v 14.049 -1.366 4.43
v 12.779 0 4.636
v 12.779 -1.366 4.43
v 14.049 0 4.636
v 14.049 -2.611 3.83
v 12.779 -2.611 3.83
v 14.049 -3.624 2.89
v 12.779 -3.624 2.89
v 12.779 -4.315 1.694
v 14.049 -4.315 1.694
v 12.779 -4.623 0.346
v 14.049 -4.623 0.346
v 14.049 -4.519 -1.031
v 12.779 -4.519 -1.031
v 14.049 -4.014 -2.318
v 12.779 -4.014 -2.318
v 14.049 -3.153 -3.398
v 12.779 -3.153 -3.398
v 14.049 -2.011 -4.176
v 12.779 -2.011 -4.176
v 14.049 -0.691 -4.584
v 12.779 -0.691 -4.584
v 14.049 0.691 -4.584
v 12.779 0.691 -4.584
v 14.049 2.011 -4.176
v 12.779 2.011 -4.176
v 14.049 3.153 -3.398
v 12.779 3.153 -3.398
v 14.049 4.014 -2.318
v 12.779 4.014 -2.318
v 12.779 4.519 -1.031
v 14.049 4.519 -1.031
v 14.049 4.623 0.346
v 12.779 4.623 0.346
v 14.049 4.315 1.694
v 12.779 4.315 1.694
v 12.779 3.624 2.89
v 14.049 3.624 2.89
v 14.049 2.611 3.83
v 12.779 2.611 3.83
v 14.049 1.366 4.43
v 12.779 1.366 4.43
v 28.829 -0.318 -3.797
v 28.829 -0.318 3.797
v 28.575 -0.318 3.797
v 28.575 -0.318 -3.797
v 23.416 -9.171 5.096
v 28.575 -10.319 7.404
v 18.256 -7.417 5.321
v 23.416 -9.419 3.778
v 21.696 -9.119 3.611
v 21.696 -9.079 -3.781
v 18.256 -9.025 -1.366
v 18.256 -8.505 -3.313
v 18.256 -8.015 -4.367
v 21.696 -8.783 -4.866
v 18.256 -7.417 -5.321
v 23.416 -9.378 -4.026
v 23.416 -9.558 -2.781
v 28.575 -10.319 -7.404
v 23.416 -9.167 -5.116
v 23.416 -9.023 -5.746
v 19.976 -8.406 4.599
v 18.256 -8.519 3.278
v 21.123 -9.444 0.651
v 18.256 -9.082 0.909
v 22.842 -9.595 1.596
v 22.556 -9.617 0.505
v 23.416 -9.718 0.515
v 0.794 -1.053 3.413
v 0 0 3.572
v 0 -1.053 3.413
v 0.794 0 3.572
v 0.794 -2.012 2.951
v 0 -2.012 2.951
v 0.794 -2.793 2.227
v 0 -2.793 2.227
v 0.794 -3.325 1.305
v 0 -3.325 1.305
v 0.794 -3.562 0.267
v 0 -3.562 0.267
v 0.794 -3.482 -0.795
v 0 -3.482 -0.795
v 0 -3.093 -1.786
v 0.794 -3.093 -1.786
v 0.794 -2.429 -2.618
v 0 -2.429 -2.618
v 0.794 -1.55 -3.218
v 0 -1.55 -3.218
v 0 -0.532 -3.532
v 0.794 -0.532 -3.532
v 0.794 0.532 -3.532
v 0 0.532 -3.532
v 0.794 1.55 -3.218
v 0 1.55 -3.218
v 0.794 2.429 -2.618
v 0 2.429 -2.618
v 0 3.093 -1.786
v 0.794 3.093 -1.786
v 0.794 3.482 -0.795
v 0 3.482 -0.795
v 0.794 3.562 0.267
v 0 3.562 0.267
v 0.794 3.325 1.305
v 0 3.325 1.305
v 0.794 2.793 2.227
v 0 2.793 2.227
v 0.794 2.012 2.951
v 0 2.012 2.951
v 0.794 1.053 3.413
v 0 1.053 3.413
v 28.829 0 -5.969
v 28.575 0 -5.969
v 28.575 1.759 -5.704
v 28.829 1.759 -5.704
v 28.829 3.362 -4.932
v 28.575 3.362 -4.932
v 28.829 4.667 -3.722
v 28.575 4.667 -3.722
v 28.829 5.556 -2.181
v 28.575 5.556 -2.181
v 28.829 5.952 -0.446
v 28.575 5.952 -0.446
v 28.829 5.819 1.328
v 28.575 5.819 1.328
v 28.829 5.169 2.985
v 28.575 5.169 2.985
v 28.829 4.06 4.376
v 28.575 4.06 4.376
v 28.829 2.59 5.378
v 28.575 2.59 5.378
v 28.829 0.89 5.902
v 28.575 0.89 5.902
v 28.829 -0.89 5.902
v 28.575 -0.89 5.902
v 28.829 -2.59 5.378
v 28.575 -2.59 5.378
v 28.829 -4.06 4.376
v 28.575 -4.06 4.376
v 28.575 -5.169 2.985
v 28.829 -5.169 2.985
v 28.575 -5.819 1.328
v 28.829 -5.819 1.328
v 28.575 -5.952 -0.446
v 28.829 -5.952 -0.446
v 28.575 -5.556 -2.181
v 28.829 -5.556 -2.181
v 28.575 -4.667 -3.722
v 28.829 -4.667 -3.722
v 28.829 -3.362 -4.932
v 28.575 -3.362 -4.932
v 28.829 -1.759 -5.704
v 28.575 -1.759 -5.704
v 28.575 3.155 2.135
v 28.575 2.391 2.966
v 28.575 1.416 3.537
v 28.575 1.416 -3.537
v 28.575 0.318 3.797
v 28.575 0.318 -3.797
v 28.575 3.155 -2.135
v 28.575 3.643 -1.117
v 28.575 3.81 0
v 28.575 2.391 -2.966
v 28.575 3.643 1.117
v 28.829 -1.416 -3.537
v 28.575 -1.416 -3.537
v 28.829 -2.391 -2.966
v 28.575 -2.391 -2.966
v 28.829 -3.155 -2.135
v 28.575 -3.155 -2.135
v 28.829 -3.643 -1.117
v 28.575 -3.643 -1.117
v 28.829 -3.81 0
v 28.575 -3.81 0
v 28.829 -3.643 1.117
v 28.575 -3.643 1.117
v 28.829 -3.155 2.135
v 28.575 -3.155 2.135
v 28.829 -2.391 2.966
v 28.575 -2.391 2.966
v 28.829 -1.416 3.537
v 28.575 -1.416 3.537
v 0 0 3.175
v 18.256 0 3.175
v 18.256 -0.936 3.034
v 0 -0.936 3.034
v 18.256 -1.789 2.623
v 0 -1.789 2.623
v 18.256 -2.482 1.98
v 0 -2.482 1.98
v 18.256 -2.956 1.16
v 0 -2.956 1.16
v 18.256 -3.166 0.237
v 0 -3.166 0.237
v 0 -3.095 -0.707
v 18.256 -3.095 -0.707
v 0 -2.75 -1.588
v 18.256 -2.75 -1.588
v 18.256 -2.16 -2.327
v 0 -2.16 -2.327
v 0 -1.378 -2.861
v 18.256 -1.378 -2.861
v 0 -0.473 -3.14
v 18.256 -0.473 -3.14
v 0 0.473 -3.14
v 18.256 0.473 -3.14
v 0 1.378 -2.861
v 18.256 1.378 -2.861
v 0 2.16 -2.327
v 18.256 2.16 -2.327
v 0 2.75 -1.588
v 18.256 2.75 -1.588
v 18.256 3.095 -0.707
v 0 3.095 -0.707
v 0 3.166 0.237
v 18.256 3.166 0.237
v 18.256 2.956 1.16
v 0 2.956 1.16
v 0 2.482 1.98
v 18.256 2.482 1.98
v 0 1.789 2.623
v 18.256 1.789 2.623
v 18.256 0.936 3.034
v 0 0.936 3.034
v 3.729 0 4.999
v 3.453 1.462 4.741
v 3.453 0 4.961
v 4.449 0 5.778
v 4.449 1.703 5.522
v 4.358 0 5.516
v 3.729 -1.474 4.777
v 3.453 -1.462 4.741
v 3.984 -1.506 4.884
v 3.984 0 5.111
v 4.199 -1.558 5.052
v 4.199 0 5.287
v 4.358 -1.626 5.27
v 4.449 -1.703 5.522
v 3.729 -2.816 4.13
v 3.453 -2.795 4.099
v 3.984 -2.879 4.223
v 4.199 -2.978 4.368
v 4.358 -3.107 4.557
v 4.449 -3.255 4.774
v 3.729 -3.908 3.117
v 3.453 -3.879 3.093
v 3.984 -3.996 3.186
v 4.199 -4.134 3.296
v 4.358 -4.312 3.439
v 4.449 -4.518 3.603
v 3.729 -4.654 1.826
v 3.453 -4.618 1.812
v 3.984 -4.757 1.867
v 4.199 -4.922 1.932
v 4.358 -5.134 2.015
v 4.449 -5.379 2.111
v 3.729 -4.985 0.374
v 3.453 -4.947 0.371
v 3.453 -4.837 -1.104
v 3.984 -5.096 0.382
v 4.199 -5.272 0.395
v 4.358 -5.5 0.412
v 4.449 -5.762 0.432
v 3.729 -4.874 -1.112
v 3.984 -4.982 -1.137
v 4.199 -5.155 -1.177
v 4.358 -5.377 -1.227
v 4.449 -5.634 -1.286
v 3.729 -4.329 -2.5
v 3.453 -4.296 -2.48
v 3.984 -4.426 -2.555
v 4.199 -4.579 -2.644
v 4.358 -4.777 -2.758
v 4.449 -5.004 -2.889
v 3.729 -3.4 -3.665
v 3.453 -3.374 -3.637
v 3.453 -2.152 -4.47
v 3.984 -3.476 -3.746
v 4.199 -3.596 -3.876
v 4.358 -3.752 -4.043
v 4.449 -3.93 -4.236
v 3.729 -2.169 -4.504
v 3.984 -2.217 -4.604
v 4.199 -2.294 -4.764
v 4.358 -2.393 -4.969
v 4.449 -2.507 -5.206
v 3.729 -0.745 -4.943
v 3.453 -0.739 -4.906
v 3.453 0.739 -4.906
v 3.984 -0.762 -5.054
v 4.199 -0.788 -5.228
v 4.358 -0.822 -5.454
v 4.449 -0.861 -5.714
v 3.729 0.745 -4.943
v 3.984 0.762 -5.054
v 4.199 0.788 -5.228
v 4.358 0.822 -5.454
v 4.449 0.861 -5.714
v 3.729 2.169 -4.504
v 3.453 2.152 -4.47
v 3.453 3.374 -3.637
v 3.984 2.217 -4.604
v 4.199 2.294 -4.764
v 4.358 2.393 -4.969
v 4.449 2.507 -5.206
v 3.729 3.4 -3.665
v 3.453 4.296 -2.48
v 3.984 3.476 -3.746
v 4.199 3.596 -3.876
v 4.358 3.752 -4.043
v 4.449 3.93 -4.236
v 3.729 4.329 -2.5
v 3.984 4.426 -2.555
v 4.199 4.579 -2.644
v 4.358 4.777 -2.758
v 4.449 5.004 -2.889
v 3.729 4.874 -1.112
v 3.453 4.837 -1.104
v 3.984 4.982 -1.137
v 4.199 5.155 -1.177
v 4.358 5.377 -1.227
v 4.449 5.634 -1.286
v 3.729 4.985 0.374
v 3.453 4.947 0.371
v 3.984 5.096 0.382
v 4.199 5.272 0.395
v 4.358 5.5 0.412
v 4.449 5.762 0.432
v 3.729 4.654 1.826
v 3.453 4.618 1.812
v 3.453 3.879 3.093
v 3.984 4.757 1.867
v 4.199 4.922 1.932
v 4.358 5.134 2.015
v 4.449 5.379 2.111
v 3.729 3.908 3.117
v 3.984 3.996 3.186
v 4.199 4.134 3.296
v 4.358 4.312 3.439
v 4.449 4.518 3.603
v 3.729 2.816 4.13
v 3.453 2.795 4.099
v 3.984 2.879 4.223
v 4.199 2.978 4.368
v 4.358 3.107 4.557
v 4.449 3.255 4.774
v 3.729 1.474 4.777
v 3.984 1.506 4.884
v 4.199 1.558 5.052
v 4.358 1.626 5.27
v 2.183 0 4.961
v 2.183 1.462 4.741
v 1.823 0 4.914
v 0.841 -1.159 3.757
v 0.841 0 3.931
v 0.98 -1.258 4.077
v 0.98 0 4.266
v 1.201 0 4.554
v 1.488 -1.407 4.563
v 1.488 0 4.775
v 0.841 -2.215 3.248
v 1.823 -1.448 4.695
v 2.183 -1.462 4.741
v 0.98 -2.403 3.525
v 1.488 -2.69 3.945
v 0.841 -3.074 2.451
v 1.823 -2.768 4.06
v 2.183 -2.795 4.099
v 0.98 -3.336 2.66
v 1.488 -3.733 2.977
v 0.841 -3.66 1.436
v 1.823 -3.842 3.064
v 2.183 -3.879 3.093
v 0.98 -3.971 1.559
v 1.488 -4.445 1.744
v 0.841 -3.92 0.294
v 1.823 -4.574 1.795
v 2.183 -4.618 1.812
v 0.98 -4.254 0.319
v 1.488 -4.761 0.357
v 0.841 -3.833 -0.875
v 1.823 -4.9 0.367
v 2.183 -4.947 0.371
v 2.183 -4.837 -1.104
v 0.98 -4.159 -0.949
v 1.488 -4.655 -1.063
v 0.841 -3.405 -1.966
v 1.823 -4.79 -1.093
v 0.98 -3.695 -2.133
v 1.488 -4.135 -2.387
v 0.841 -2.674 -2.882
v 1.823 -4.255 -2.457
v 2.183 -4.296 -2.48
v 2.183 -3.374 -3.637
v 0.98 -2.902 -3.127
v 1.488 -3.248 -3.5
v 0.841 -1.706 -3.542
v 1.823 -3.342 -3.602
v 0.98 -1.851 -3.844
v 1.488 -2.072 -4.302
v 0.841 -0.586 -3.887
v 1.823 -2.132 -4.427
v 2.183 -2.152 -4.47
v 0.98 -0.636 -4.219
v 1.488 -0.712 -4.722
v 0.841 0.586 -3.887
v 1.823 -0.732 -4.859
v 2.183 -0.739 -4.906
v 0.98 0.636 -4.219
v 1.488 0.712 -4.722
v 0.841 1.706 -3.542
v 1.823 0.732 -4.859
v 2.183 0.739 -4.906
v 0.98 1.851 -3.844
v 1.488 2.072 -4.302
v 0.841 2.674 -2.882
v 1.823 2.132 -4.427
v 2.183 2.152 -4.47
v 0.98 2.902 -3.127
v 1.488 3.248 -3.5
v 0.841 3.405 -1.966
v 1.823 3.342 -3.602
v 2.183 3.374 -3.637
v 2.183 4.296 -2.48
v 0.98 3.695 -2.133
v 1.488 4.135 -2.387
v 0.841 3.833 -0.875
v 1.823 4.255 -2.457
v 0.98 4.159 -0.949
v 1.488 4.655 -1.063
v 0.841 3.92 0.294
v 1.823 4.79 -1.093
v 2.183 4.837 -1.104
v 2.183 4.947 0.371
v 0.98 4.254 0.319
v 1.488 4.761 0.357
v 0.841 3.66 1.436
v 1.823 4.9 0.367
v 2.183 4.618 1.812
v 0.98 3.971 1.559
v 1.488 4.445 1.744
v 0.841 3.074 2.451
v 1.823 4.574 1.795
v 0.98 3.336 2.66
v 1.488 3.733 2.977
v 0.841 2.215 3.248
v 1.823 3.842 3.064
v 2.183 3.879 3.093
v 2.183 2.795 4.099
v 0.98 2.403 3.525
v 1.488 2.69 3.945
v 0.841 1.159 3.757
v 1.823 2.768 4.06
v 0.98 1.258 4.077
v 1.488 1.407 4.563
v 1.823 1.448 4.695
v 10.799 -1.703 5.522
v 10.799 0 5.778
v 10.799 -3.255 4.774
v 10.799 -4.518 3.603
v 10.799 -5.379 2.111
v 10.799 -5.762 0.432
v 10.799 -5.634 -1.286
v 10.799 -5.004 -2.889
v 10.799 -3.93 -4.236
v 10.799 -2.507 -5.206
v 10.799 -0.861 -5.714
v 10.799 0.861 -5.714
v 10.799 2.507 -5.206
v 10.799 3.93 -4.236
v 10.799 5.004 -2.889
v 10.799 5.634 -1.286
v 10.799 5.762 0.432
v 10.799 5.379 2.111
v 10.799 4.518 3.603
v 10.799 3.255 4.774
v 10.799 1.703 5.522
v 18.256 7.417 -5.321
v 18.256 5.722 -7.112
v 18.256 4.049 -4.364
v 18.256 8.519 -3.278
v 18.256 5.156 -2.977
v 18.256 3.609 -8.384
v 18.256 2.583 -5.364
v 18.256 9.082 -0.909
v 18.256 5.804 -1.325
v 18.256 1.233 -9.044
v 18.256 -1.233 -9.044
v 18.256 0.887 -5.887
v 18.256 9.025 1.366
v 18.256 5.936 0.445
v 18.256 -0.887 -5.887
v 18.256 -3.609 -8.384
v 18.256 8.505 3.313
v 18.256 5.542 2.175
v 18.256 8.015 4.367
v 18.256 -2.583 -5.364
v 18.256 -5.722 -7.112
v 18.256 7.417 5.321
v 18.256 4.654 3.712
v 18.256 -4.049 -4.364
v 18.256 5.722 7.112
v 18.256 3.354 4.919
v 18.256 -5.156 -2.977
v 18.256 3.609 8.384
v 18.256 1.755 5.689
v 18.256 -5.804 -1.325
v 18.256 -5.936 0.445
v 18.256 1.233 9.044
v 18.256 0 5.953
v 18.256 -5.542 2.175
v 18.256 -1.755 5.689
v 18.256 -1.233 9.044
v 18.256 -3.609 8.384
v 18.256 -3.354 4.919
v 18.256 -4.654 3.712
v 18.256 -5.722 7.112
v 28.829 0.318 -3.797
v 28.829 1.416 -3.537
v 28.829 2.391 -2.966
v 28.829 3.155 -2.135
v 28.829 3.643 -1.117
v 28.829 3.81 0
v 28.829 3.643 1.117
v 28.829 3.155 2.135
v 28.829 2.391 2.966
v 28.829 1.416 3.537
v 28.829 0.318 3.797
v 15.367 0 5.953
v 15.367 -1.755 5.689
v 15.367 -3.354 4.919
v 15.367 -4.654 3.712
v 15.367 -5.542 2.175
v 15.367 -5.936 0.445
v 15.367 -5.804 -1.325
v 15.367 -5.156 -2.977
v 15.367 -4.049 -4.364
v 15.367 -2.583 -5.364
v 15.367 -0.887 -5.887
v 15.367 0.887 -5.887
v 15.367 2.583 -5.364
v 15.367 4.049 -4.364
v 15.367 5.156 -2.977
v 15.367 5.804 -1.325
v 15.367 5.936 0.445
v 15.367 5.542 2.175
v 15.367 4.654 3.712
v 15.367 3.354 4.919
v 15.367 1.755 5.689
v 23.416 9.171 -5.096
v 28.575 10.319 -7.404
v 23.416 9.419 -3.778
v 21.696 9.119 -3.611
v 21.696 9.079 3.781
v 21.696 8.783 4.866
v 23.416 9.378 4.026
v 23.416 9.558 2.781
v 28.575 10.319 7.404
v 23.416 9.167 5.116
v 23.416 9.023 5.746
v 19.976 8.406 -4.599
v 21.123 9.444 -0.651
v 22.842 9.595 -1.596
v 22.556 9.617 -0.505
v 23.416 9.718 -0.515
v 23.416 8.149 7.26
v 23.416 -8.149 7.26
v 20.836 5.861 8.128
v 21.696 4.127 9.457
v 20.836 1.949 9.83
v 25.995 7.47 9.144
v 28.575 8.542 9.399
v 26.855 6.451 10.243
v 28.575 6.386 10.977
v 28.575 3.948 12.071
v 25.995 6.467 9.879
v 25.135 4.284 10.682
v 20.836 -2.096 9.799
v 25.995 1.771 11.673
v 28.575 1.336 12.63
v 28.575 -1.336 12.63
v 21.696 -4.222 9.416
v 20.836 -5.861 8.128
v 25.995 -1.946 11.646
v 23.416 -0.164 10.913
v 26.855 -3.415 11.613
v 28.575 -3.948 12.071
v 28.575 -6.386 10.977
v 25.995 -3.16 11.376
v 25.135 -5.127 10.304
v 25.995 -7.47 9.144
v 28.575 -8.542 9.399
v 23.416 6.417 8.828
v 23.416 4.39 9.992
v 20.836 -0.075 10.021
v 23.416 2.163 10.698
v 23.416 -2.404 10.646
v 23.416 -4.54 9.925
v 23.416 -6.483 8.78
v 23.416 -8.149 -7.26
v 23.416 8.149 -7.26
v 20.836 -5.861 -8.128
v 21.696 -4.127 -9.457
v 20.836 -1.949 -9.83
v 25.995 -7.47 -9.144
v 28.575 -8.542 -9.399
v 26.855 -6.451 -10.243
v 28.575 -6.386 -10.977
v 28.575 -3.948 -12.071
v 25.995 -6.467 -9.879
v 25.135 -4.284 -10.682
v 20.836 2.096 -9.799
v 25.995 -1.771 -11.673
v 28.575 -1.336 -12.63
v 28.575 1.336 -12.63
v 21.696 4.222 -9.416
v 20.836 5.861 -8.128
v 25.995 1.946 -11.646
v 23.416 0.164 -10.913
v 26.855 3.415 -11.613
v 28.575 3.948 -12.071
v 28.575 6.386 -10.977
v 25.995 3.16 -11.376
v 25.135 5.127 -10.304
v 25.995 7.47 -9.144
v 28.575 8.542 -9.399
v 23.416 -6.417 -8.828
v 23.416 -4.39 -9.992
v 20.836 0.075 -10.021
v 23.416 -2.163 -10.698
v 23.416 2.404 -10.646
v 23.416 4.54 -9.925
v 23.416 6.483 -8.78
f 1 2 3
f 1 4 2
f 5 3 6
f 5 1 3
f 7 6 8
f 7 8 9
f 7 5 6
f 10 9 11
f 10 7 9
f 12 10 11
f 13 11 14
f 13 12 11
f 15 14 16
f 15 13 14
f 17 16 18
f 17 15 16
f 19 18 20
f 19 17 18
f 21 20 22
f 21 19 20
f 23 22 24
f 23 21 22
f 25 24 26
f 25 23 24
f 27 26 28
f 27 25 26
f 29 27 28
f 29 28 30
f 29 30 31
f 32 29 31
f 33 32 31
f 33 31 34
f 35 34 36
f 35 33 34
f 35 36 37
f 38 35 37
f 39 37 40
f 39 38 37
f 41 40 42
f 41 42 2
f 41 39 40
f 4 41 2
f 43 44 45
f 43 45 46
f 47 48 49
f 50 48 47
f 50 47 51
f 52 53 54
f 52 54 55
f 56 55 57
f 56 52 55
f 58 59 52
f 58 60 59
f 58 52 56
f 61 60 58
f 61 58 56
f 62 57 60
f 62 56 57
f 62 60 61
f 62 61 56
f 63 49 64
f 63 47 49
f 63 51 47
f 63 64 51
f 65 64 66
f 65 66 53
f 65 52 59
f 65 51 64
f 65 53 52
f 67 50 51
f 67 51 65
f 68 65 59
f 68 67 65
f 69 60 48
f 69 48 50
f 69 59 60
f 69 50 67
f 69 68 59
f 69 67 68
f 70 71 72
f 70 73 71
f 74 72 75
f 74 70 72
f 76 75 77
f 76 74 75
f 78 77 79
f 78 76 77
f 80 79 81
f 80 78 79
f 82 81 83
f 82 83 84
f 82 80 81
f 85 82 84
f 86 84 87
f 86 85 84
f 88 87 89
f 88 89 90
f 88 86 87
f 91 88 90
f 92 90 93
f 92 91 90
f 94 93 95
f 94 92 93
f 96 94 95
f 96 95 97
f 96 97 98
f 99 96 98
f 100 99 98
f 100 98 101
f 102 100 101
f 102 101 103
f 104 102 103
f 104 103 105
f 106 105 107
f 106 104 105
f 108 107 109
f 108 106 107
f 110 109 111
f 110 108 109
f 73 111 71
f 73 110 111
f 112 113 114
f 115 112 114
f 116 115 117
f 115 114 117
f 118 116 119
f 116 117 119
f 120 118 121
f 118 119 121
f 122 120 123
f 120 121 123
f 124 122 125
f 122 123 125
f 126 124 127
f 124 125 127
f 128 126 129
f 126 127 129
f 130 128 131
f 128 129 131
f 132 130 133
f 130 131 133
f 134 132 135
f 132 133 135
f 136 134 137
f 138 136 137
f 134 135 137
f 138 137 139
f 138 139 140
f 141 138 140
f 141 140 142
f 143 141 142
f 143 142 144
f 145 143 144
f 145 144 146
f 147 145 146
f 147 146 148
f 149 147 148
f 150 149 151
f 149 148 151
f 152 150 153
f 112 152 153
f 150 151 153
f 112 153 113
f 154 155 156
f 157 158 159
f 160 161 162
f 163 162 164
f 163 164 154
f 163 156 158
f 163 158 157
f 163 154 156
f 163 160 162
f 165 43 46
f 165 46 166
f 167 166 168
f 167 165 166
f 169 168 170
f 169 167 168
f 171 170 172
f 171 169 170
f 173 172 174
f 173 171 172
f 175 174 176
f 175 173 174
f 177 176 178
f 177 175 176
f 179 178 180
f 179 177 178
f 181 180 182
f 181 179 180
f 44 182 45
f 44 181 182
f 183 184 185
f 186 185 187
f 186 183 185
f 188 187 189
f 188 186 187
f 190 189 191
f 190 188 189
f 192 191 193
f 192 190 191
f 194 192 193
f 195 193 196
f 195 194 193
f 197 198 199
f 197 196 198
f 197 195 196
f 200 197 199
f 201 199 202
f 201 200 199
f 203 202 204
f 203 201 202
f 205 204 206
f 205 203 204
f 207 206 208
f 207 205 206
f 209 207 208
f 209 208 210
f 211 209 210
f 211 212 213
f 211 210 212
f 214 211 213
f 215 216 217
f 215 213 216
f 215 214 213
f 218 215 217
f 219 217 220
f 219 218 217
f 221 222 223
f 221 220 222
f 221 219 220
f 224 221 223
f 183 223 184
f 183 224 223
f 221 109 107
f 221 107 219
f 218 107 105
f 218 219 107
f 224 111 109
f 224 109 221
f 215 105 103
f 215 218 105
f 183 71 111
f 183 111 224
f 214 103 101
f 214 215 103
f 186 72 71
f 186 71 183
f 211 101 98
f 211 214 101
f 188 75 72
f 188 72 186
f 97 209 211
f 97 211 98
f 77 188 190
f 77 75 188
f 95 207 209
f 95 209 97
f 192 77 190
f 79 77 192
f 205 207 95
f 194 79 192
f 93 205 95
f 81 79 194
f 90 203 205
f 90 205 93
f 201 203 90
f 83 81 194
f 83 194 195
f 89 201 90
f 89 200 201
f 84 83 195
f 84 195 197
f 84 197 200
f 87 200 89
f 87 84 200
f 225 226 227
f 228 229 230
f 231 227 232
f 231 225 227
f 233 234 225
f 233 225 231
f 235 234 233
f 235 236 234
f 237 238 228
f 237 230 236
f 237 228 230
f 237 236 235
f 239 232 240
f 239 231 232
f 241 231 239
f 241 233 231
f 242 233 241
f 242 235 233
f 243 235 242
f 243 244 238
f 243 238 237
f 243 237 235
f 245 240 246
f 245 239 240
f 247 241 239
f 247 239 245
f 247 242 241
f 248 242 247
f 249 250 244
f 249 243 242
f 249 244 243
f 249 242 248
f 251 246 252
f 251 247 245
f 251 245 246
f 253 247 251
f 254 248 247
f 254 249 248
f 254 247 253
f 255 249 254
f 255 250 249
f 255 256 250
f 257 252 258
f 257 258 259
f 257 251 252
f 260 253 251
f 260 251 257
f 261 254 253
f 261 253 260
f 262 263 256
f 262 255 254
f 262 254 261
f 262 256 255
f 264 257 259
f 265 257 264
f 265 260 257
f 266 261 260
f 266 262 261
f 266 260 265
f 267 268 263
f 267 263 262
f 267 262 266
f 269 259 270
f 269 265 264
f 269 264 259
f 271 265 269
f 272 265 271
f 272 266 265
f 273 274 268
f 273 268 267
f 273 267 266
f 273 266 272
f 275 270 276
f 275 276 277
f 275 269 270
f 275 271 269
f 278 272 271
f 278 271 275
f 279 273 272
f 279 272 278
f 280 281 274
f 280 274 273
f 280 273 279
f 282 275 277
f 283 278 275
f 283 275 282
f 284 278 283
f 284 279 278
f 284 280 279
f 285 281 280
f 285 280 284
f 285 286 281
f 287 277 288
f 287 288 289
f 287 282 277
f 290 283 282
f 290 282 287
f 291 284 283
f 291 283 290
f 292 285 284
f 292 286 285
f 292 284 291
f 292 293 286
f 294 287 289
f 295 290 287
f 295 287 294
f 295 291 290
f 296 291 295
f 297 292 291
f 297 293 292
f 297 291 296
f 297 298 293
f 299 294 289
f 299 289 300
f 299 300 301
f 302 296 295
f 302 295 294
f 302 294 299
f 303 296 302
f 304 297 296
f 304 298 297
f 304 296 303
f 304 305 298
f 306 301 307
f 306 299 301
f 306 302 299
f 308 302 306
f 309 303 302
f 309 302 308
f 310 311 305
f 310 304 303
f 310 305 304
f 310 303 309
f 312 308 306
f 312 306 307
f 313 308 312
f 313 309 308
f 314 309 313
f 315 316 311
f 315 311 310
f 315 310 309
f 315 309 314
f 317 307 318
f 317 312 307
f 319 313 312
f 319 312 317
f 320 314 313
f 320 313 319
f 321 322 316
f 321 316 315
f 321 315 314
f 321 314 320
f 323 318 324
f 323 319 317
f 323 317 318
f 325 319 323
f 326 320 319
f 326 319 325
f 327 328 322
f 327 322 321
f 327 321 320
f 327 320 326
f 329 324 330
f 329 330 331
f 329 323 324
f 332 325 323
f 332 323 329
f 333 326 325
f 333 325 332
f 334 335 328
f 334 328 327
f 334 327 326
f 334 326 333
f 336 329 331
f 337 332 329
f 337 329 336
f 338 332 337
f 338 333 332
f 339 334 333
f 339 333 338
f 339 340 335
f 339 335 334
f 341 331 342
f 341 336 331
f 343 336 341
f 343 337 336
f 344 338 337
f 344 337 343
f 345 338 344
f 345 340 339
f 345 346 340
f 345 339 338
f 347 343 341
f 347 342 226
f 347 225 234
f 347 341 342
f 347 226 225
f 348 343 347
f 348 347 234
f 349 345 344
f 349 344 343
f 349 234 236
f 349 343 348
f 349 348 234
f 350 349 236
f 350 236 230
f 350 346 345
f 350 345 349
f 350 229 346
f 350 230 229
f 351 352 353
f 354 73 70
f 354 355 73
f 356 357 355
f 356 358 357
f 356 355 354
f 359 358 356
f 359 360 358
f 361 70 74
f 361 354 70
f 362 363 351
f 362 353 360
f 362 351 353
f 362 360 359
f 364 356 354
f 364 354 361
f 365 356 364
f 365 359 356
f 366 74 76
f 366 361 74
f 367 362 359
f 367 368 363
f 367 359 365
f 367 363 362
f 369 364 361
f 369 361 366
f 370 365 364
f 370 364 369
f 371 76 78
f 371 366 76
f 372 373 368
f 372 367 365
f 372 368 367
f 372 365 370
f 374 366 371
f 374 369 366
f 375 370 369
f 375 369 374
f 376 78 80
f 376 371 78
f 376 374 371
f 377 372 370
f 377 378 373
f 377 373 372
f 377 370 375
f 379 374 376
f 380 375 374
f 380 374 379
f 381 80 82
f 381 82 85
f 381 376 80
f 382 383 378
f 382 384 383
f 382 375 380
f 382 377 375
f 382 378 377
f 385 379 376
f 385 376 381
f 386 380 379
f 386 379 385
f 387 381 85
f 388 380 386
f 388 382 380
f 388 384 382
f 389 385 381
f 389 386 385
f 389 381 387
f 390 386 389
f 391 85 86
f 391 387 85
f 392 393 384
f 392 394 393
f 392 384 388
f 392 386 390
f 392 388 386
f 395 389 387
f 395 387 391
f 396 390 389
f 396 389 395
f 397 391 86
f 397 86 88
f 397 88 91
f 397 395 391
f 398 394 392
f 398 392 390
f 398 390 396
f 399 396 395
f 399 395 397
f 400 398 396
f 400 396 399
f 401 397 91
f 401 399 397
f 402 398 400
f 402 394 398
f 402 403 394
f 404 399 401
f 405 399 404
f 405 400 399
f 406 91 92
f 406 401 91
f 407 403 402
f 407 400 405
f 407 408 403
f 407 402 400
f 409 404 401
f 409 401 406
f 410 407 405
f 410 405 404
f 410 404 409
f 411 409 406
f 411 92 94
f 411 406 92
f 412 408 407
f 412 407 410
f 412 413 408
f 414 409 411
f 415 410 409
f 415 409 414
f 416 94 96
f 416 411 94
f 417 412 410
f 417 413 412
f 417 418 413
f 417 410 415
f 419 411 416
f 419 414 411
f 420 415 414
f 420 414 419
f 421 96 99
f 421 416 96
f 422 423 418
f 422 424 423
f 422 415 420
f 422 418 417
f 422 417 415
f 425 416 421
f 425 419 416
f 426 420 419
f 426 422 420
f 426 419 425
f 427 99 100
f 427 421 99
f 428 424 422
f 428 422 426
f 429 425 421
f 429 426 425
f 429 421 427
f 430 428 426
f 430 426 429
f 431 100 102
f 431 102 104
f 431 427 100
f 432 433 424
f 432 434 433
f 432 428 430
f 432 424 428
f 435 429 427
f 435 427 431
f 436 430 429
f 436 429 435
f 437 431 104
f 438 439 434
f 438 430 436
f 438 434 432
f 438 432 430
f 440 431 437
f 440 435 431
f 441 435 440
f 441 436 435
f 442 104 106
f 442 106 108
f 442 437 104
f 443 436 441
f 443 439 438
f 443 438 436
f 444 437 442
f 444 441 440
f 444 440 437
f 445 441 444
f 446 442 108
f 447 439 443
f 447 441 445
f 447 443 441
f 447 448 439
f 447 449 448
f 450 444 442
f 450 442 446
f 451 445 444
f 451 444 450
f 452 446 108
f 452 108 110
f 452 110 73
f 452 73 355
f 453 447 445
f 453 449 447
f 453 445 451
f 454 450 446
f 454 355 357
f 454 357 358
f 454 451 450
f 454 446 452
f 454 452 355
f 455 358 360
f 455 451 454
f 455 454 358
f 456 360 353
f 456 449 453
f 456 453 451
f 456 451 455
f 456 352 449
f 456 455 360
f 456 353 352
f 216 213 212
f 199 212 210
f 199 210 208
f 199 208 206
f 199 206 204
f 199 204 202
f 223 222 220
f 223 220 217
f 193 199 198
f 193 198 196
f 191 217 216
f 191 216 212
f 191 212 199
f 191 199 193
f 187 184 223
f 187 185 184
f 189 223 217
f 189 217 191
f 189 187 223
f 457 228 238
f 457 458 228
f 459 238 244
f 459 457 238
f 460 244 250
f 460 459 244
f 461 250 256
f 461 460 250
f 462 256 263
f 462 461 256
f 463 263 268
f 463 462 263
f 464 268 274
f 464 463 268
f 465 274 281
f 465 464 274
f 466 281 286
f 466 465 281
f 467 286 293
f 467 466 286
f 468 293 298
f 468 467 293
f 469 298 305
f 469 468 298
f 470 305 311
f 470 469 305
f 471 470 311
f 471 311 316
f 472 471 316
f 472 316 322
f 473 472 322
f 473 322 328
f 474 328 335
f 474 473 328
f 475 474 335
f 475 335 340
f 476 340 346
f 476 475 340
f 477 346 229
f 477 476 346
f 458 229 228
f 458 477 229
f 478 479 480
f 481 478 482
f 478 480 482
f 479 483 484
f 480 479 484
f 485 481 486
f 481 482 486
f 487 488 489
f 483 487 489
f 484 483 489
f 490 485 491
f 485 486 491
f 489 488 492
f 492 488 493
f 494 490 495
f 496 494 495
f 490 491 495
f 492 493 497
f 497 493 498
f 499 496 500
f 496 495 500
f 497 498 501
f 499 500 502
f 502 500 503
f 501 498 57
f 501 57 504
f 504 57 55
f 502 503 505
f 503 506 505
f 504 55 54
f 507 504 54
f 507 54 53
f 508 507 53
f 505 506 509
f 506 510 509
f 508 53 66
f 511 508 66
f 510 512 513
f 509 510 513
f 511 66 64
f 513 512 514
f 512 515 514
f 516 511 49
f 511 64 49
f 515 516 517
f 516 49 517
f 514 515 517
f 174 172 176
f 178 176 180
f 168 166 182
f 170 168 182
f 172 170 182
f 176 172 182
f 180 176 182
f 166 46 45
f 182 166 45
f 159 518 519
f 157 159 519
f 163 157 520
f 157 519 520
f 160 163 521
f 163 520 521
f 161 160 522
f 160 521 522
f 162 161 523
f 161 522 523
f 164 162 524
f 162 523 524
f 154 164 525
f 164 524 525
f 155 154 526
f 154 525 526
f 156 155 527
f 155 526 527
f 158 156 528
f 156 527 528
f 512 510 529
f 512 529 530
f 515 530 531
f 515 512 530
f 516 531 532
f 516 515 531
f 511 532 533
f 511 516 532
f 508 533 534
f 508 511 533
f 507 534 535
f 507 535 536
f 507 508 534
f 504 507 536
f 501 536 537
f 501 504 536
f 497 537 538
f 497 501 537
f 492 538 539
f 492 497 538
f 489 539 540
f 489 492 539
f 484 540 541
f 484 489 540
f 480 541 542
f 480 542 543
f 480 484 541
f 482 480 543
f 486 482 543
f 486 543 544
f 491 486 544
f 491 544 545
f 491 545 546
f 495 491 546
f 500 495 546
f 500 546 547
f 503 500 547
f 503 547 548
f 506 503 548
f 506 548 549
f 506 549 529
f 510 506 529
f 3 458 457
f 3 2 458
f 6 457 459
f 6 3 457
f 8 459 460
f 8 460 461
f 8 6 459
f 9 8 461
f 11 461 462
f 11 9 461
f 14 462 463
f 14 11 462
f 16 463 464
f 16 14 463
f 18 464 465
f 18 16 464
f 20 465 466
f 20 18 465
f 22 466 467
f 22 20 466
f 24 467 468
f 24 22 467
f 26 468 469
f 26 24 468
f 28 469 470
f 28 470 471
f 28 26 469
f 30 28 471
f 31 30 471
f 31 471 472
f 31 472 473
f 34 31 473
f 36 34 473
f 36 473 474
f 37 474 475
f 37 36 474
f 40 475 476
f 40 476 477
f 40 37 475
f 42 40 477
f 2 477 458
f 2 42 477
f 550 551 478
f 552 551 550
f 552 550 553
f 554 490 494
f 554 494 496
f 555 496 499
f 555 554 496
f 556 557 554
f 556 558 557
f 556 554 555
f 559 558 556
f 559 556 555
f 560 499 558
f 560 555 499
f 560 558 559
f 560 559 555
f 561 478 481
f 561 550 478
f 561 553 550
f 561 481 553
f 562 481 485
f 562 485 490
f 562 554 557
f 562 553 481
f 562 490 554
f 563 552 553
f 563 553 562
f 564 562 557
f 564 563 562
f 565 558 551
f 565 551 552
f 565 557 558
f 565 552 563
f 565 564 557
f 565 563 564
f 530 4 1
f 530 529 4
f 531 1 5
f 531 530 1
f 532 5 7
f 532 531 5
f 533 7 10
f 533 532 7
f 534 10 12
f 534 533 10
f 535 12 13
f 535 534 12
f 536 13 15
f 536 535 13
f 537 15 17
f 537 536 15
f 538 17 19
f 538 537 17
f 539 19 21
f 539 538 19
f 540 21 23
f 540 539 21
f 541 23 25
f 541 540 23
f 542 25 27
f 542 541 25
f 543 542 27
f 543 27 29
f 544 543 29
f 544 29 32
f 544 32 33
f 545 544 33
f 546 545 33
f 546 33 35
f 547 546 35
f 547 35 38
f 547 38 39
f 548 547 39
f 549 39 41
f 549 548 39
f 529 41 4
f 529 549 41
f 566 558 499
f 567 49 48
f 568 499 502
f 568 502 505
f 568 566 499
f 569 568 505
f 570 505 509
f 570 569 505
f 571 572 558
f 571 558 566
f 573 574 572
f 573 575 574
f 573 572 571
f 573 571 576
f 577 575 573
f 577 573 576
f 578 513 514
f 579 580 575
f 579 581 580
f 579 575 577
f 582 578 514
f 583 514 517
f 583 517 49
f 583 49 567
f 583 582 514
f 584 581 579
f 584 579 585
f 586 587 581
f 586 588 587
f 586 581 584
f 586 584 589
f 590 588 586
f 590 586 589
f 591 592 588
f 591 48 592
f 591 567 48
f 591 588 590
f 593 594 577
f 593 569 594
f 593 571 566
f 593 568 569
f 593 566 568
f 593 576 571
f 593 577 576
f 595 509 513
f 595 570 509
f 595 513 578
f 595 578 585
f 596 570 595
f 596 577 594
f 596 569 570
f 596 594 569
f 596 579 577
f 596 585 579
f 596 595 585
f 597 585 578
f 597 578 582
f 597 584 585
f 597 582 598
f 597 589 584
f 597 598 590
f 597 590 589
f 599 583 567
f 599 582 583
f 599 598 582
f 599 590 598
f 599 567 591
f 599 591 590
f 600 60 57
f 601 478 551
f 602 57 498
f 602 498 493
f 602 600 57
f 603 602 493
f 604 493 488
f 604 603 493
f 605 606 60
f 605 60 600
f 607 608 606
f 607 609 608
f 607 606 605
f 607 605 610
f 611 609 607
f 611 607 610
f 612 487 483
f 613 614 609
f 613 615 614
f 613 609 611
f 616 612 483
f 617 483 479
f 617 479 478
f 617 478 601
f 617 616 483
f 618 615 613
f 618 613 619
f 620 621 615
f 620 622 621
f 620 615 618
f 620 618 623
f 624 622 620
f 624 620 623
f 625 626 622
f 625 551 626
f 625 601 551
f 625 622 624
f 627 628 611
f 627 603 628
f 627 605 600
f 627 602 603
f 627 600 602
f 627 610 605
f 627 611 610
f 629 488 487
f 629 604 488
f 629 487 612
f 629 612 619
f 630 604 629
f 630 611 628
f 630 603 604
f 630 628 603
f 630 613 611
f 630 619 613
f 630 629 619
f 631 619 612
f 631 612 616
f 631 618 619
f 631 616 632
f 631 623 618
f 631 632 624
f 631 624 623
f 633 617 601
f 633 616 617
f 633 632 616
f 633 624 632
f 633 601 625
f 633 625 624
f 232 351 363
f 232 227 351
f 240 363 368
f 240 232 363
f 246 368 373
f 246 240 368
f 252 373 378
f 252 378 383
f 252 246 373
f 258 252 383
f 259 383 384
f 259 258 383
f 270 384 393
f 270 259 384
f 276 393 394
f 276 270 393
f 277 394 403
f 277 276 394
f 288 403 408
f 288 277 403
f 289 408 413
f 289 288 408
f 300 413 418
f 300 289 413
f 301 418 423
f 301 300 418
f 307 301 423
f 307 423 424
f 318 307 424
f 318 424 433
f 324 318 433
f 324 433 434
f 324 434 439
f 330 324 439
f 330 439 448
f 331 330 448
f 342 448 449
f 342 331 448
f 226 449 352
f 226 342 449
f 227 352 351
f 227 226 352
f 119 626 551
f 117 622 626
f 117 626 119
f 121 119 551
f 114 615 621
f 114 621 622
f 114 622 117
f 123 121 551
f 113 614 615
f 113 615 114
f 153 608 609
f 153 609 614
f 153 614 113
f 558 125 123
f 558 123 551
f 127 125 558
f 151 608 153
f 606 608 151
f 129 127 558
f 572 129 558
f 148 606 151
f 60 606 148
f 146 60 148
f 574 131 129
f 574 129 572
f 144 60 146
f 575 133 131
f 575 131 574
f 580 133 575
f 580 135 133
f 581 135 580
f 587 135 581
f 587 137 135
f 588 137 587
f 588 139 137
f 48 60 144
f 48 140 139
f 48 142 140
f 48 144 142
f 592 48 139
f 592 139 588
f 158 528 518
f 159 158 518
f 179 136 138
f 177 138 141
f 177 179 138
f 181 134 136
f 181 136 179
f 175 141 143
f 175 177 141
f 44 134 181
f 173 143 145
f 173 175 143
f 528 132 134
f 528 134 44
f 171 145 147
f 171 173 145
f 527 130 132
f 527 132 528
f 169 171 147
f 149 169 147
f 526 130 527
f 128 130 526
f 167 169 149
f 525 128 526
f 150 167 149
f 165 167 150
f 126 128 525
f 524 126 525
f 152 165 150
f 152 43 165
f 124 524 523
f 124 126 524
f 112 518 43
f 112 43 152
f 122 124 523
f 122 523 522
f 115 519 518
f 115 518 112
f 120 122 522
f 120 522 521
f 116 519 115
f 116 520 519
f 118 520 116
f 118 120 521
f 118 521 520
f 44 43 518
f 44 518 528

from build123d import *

# Parameters (mm, degrees)
LOFT1_OUTLINE_W     = 5.953125
LOFT1_OUTLINE_H     = 10.31875
SKETCH5_R           = 5.969
BOSS_EXTRUDE1_DEPTH = 0.254
CUT_EXTRUDE1_DEPTH  = 0.254


with BuildPart() as part:
    # Sketch1 → Revolve1 (revolve)
    with BuildSketch(Plane(origin=(0, 0, 0), x_dir=(1, 0, 0), z_dir=(0, 1, 0)), mode=Mode.PRIVATE) as revolve1_sk:
        with BuildLine():
            Line((0, 3.571875), (0.79375, 3.571875))
            ThreePointArc((0.79375, 3.571875), (1.200596987, 4.554090513), (2.1828125, 4.9609375))
            Line((2.1828125, 4.9609375), (3.4528125, 4.9609375))
            ThreePointArc((3.4528125, 4.9609375), (4.097267114, 5.191485878), (4.449245417, 5.7785))
            Line((4.449245417, 5.7785), (10.799245417, 5.7785))
            Line((10.799245417, 5.7785), (12.77897949, 4.6355))
            Line((12.77897949, 4.6355), (14.04897949, 4.6355))
            Line((14.04897949, 4.6355), (15.36660449, 5.953125))
            Line((15.36660449, 5.953125), (28.575, 5.953125))
            Line((28.575, 5.953125), (28.575, 3.175))
            Line((28.575, 3.175), (0, 3.175))
            Line((0, 3.175), (0, 3.571875))
        make_face()
    revolve(revolve1_sk.sketch.rotate(Axis((0, 0, 0), (1, 0, 0)), 180), axis=Axis((0, 0, 0), (1, 0, 0)))

    # Loft1: read off the stored shape, not the designer's step
    # Loft1 outline → Loft1 (revolve)
    with BuildSketch(Plane.YX):
        with Locations((2.9765625, 23.415625)):
            Rectangle(LOFT1_OUTLINE_W, LOFT1_OUTLINE_H)
    revolve(axis=Axis((0, 0, 0), (1, 0, 0)))

    # Loft1 2: loft between two sections, ruled curve by curve
    loft1_2_from = [
        Edge.make_bspline([(18.25625, -7.416601563, 5.32134262), (18.25625, -7.933624268, 4.60074414), (18.25625, -8.368790825, 3.767765601), (18.25625, -8.966975982, 1.956031503), (18.25625, -9.128125, 0.978637723), (18.25625, -9.128125, -0.978637723), (18.25625, -8.966975982, -1.956031503), (18.25625, -8.368790825, -3.767765601), (18.25625, -7.933624268, -4.60074414), (18.25625, -7.416601563, -5.32134262)], [0, 0, 0, 0, 0.25, 0.25, 0.5, 0.5, 0.75, 0.75, 1, 1, 1, 1], 3),
        Edge.make_bspline([(18.25625, 7.416601563, -5.32134262), (18.25625, 7.933624268, -4.60074414), (18.25625, 8.368790825, -3.767765601), (18.25625, 8.966975982, -1.956031503), (18.25625, 9.128125, -0.978637723), (18.25625, 9.128125, 0.978637723), (18.25625, 8.966975982, 1.956031503), (18.25625, 8.368790825, 3.767765601), (18.25625, 7.933624268, 4.60074414), (18.25625, 7.416601563, 5.32134262)], [0, 0, 0, 0, 0.25, 0.25, 0.5, 0.5, 0.75, 0.75, 1, 1, 1, 1], 3),
        Edge.make_three_point_arc((18.25625, -7.416601563, -5.32134262), (18.25625, 0, -9.128125), (18.25625, 7.416601563, -5.32134262)),
        Edge.make_three_point_arc((18.25625, 7.416601563, 5.32134262), (18.25625, 0, 9.128125), (18.25625, -7.416601563, 5.32134262)),
    ]
    loft1_2_to = [
        Edge.make_bspline([(28.575, -10.31875, 7.403607123), (28.575, -10.31875, 6.169672603), (28.575, -10.31875, 4.935738082), (28.575, -10.31875, 2.467869041), (28.575, -10.31875, 1.233934521), (28.575, -10.31875, -1.233934521), (28.575, -10.31875, -2.467869041), (28.575, -10.31875, -4.935738082), (28.575, -10.31875, -6.169672603), (28.575, -10.31875, -7.403607123)], [0, 0, 0, 0, 0.25, 0.25, 0.5, 0.5, 0.75, 0.75, 1, 1, 1, 1], 3),
        Edge.make_bspline([(28.575, 10.31875, -7.403607123), (28.575, 10.31875, -6.169672603), (28.575, 10.31875, -4.935738082), (28.575, 10.31875, -2.467869041), (28.575, 10.31875, -1.233934521), (28.575, 10.31875, 1.233934521), (28.575, 10.31875, 2.467869041), (28.575, 10.31875, 4.935738082), (28.575, 10.31875, 6.169672603), (28.575, 10.31875, 7.403607123)], [0, 0, 0, 0, 0.25, 0.25, 0.5, 0.5, 0.75, 0.75, 1, 1, 1, 1], 3),
        Edge.make_three_point_arc((28.575, -10.31875, -7.403607123), (28.575, 0, -12.7), (28.575, 10.31875, -7.403607123)),
        Edge.make_three_point_arc((28.575, 10.31875, 7.403607123), (28.575, 0, 12.7), (28.575, -10.31875, 7.403607123)),
    ]
    loft1_2 = Solid(Shell([*[Face.make_surface_from_curves(loft1_2_from[k], loft1_2_to[k]) for k in range(4)], Face(Wire(loft1_2_from)), Face(Wire(loft1_2_to))]))
    add(loft1_2)

    # Sketch5 → Boss-Extrude1 (add)
    with BuildSketch(Plane(origin=(28.575, 0, 0), x_dir=(0, 0, -1), z_dir=(1, 0, 0))):
        Circle(SKETCH5_R)
    extrude(amount=BOSS_EXTRUDE1_DEPTH)

    # Sketch6 → Cut-Extrude1 (cut)
    with BuildSketch(Plane(origin=(28.829, 0, 0), x_dir=(0, 0, -1), z_dir=(1, 0, 0))):
        with BuildLine():
            Line((-3.796747786, 0.3175), (3.796747786, 0.3175))
            ThreePointArc((3.796747786, 0.3175), (0, 3.81), (-3.796747786, 0.3175))
        make_face()
        with BuildLine():
            Line((-3.796747786, -0.3175), (3.796747786, -0.3175))
            ThreePointArc((3.796747786, -0.3175), (0, -3.81), (-3.796747786, -0.3175))
        make_face()
    extrude(amount=-CUT_EXTRUDE1_DEPTH, mode=Mode.SUBTRACT)


solid = part.part
